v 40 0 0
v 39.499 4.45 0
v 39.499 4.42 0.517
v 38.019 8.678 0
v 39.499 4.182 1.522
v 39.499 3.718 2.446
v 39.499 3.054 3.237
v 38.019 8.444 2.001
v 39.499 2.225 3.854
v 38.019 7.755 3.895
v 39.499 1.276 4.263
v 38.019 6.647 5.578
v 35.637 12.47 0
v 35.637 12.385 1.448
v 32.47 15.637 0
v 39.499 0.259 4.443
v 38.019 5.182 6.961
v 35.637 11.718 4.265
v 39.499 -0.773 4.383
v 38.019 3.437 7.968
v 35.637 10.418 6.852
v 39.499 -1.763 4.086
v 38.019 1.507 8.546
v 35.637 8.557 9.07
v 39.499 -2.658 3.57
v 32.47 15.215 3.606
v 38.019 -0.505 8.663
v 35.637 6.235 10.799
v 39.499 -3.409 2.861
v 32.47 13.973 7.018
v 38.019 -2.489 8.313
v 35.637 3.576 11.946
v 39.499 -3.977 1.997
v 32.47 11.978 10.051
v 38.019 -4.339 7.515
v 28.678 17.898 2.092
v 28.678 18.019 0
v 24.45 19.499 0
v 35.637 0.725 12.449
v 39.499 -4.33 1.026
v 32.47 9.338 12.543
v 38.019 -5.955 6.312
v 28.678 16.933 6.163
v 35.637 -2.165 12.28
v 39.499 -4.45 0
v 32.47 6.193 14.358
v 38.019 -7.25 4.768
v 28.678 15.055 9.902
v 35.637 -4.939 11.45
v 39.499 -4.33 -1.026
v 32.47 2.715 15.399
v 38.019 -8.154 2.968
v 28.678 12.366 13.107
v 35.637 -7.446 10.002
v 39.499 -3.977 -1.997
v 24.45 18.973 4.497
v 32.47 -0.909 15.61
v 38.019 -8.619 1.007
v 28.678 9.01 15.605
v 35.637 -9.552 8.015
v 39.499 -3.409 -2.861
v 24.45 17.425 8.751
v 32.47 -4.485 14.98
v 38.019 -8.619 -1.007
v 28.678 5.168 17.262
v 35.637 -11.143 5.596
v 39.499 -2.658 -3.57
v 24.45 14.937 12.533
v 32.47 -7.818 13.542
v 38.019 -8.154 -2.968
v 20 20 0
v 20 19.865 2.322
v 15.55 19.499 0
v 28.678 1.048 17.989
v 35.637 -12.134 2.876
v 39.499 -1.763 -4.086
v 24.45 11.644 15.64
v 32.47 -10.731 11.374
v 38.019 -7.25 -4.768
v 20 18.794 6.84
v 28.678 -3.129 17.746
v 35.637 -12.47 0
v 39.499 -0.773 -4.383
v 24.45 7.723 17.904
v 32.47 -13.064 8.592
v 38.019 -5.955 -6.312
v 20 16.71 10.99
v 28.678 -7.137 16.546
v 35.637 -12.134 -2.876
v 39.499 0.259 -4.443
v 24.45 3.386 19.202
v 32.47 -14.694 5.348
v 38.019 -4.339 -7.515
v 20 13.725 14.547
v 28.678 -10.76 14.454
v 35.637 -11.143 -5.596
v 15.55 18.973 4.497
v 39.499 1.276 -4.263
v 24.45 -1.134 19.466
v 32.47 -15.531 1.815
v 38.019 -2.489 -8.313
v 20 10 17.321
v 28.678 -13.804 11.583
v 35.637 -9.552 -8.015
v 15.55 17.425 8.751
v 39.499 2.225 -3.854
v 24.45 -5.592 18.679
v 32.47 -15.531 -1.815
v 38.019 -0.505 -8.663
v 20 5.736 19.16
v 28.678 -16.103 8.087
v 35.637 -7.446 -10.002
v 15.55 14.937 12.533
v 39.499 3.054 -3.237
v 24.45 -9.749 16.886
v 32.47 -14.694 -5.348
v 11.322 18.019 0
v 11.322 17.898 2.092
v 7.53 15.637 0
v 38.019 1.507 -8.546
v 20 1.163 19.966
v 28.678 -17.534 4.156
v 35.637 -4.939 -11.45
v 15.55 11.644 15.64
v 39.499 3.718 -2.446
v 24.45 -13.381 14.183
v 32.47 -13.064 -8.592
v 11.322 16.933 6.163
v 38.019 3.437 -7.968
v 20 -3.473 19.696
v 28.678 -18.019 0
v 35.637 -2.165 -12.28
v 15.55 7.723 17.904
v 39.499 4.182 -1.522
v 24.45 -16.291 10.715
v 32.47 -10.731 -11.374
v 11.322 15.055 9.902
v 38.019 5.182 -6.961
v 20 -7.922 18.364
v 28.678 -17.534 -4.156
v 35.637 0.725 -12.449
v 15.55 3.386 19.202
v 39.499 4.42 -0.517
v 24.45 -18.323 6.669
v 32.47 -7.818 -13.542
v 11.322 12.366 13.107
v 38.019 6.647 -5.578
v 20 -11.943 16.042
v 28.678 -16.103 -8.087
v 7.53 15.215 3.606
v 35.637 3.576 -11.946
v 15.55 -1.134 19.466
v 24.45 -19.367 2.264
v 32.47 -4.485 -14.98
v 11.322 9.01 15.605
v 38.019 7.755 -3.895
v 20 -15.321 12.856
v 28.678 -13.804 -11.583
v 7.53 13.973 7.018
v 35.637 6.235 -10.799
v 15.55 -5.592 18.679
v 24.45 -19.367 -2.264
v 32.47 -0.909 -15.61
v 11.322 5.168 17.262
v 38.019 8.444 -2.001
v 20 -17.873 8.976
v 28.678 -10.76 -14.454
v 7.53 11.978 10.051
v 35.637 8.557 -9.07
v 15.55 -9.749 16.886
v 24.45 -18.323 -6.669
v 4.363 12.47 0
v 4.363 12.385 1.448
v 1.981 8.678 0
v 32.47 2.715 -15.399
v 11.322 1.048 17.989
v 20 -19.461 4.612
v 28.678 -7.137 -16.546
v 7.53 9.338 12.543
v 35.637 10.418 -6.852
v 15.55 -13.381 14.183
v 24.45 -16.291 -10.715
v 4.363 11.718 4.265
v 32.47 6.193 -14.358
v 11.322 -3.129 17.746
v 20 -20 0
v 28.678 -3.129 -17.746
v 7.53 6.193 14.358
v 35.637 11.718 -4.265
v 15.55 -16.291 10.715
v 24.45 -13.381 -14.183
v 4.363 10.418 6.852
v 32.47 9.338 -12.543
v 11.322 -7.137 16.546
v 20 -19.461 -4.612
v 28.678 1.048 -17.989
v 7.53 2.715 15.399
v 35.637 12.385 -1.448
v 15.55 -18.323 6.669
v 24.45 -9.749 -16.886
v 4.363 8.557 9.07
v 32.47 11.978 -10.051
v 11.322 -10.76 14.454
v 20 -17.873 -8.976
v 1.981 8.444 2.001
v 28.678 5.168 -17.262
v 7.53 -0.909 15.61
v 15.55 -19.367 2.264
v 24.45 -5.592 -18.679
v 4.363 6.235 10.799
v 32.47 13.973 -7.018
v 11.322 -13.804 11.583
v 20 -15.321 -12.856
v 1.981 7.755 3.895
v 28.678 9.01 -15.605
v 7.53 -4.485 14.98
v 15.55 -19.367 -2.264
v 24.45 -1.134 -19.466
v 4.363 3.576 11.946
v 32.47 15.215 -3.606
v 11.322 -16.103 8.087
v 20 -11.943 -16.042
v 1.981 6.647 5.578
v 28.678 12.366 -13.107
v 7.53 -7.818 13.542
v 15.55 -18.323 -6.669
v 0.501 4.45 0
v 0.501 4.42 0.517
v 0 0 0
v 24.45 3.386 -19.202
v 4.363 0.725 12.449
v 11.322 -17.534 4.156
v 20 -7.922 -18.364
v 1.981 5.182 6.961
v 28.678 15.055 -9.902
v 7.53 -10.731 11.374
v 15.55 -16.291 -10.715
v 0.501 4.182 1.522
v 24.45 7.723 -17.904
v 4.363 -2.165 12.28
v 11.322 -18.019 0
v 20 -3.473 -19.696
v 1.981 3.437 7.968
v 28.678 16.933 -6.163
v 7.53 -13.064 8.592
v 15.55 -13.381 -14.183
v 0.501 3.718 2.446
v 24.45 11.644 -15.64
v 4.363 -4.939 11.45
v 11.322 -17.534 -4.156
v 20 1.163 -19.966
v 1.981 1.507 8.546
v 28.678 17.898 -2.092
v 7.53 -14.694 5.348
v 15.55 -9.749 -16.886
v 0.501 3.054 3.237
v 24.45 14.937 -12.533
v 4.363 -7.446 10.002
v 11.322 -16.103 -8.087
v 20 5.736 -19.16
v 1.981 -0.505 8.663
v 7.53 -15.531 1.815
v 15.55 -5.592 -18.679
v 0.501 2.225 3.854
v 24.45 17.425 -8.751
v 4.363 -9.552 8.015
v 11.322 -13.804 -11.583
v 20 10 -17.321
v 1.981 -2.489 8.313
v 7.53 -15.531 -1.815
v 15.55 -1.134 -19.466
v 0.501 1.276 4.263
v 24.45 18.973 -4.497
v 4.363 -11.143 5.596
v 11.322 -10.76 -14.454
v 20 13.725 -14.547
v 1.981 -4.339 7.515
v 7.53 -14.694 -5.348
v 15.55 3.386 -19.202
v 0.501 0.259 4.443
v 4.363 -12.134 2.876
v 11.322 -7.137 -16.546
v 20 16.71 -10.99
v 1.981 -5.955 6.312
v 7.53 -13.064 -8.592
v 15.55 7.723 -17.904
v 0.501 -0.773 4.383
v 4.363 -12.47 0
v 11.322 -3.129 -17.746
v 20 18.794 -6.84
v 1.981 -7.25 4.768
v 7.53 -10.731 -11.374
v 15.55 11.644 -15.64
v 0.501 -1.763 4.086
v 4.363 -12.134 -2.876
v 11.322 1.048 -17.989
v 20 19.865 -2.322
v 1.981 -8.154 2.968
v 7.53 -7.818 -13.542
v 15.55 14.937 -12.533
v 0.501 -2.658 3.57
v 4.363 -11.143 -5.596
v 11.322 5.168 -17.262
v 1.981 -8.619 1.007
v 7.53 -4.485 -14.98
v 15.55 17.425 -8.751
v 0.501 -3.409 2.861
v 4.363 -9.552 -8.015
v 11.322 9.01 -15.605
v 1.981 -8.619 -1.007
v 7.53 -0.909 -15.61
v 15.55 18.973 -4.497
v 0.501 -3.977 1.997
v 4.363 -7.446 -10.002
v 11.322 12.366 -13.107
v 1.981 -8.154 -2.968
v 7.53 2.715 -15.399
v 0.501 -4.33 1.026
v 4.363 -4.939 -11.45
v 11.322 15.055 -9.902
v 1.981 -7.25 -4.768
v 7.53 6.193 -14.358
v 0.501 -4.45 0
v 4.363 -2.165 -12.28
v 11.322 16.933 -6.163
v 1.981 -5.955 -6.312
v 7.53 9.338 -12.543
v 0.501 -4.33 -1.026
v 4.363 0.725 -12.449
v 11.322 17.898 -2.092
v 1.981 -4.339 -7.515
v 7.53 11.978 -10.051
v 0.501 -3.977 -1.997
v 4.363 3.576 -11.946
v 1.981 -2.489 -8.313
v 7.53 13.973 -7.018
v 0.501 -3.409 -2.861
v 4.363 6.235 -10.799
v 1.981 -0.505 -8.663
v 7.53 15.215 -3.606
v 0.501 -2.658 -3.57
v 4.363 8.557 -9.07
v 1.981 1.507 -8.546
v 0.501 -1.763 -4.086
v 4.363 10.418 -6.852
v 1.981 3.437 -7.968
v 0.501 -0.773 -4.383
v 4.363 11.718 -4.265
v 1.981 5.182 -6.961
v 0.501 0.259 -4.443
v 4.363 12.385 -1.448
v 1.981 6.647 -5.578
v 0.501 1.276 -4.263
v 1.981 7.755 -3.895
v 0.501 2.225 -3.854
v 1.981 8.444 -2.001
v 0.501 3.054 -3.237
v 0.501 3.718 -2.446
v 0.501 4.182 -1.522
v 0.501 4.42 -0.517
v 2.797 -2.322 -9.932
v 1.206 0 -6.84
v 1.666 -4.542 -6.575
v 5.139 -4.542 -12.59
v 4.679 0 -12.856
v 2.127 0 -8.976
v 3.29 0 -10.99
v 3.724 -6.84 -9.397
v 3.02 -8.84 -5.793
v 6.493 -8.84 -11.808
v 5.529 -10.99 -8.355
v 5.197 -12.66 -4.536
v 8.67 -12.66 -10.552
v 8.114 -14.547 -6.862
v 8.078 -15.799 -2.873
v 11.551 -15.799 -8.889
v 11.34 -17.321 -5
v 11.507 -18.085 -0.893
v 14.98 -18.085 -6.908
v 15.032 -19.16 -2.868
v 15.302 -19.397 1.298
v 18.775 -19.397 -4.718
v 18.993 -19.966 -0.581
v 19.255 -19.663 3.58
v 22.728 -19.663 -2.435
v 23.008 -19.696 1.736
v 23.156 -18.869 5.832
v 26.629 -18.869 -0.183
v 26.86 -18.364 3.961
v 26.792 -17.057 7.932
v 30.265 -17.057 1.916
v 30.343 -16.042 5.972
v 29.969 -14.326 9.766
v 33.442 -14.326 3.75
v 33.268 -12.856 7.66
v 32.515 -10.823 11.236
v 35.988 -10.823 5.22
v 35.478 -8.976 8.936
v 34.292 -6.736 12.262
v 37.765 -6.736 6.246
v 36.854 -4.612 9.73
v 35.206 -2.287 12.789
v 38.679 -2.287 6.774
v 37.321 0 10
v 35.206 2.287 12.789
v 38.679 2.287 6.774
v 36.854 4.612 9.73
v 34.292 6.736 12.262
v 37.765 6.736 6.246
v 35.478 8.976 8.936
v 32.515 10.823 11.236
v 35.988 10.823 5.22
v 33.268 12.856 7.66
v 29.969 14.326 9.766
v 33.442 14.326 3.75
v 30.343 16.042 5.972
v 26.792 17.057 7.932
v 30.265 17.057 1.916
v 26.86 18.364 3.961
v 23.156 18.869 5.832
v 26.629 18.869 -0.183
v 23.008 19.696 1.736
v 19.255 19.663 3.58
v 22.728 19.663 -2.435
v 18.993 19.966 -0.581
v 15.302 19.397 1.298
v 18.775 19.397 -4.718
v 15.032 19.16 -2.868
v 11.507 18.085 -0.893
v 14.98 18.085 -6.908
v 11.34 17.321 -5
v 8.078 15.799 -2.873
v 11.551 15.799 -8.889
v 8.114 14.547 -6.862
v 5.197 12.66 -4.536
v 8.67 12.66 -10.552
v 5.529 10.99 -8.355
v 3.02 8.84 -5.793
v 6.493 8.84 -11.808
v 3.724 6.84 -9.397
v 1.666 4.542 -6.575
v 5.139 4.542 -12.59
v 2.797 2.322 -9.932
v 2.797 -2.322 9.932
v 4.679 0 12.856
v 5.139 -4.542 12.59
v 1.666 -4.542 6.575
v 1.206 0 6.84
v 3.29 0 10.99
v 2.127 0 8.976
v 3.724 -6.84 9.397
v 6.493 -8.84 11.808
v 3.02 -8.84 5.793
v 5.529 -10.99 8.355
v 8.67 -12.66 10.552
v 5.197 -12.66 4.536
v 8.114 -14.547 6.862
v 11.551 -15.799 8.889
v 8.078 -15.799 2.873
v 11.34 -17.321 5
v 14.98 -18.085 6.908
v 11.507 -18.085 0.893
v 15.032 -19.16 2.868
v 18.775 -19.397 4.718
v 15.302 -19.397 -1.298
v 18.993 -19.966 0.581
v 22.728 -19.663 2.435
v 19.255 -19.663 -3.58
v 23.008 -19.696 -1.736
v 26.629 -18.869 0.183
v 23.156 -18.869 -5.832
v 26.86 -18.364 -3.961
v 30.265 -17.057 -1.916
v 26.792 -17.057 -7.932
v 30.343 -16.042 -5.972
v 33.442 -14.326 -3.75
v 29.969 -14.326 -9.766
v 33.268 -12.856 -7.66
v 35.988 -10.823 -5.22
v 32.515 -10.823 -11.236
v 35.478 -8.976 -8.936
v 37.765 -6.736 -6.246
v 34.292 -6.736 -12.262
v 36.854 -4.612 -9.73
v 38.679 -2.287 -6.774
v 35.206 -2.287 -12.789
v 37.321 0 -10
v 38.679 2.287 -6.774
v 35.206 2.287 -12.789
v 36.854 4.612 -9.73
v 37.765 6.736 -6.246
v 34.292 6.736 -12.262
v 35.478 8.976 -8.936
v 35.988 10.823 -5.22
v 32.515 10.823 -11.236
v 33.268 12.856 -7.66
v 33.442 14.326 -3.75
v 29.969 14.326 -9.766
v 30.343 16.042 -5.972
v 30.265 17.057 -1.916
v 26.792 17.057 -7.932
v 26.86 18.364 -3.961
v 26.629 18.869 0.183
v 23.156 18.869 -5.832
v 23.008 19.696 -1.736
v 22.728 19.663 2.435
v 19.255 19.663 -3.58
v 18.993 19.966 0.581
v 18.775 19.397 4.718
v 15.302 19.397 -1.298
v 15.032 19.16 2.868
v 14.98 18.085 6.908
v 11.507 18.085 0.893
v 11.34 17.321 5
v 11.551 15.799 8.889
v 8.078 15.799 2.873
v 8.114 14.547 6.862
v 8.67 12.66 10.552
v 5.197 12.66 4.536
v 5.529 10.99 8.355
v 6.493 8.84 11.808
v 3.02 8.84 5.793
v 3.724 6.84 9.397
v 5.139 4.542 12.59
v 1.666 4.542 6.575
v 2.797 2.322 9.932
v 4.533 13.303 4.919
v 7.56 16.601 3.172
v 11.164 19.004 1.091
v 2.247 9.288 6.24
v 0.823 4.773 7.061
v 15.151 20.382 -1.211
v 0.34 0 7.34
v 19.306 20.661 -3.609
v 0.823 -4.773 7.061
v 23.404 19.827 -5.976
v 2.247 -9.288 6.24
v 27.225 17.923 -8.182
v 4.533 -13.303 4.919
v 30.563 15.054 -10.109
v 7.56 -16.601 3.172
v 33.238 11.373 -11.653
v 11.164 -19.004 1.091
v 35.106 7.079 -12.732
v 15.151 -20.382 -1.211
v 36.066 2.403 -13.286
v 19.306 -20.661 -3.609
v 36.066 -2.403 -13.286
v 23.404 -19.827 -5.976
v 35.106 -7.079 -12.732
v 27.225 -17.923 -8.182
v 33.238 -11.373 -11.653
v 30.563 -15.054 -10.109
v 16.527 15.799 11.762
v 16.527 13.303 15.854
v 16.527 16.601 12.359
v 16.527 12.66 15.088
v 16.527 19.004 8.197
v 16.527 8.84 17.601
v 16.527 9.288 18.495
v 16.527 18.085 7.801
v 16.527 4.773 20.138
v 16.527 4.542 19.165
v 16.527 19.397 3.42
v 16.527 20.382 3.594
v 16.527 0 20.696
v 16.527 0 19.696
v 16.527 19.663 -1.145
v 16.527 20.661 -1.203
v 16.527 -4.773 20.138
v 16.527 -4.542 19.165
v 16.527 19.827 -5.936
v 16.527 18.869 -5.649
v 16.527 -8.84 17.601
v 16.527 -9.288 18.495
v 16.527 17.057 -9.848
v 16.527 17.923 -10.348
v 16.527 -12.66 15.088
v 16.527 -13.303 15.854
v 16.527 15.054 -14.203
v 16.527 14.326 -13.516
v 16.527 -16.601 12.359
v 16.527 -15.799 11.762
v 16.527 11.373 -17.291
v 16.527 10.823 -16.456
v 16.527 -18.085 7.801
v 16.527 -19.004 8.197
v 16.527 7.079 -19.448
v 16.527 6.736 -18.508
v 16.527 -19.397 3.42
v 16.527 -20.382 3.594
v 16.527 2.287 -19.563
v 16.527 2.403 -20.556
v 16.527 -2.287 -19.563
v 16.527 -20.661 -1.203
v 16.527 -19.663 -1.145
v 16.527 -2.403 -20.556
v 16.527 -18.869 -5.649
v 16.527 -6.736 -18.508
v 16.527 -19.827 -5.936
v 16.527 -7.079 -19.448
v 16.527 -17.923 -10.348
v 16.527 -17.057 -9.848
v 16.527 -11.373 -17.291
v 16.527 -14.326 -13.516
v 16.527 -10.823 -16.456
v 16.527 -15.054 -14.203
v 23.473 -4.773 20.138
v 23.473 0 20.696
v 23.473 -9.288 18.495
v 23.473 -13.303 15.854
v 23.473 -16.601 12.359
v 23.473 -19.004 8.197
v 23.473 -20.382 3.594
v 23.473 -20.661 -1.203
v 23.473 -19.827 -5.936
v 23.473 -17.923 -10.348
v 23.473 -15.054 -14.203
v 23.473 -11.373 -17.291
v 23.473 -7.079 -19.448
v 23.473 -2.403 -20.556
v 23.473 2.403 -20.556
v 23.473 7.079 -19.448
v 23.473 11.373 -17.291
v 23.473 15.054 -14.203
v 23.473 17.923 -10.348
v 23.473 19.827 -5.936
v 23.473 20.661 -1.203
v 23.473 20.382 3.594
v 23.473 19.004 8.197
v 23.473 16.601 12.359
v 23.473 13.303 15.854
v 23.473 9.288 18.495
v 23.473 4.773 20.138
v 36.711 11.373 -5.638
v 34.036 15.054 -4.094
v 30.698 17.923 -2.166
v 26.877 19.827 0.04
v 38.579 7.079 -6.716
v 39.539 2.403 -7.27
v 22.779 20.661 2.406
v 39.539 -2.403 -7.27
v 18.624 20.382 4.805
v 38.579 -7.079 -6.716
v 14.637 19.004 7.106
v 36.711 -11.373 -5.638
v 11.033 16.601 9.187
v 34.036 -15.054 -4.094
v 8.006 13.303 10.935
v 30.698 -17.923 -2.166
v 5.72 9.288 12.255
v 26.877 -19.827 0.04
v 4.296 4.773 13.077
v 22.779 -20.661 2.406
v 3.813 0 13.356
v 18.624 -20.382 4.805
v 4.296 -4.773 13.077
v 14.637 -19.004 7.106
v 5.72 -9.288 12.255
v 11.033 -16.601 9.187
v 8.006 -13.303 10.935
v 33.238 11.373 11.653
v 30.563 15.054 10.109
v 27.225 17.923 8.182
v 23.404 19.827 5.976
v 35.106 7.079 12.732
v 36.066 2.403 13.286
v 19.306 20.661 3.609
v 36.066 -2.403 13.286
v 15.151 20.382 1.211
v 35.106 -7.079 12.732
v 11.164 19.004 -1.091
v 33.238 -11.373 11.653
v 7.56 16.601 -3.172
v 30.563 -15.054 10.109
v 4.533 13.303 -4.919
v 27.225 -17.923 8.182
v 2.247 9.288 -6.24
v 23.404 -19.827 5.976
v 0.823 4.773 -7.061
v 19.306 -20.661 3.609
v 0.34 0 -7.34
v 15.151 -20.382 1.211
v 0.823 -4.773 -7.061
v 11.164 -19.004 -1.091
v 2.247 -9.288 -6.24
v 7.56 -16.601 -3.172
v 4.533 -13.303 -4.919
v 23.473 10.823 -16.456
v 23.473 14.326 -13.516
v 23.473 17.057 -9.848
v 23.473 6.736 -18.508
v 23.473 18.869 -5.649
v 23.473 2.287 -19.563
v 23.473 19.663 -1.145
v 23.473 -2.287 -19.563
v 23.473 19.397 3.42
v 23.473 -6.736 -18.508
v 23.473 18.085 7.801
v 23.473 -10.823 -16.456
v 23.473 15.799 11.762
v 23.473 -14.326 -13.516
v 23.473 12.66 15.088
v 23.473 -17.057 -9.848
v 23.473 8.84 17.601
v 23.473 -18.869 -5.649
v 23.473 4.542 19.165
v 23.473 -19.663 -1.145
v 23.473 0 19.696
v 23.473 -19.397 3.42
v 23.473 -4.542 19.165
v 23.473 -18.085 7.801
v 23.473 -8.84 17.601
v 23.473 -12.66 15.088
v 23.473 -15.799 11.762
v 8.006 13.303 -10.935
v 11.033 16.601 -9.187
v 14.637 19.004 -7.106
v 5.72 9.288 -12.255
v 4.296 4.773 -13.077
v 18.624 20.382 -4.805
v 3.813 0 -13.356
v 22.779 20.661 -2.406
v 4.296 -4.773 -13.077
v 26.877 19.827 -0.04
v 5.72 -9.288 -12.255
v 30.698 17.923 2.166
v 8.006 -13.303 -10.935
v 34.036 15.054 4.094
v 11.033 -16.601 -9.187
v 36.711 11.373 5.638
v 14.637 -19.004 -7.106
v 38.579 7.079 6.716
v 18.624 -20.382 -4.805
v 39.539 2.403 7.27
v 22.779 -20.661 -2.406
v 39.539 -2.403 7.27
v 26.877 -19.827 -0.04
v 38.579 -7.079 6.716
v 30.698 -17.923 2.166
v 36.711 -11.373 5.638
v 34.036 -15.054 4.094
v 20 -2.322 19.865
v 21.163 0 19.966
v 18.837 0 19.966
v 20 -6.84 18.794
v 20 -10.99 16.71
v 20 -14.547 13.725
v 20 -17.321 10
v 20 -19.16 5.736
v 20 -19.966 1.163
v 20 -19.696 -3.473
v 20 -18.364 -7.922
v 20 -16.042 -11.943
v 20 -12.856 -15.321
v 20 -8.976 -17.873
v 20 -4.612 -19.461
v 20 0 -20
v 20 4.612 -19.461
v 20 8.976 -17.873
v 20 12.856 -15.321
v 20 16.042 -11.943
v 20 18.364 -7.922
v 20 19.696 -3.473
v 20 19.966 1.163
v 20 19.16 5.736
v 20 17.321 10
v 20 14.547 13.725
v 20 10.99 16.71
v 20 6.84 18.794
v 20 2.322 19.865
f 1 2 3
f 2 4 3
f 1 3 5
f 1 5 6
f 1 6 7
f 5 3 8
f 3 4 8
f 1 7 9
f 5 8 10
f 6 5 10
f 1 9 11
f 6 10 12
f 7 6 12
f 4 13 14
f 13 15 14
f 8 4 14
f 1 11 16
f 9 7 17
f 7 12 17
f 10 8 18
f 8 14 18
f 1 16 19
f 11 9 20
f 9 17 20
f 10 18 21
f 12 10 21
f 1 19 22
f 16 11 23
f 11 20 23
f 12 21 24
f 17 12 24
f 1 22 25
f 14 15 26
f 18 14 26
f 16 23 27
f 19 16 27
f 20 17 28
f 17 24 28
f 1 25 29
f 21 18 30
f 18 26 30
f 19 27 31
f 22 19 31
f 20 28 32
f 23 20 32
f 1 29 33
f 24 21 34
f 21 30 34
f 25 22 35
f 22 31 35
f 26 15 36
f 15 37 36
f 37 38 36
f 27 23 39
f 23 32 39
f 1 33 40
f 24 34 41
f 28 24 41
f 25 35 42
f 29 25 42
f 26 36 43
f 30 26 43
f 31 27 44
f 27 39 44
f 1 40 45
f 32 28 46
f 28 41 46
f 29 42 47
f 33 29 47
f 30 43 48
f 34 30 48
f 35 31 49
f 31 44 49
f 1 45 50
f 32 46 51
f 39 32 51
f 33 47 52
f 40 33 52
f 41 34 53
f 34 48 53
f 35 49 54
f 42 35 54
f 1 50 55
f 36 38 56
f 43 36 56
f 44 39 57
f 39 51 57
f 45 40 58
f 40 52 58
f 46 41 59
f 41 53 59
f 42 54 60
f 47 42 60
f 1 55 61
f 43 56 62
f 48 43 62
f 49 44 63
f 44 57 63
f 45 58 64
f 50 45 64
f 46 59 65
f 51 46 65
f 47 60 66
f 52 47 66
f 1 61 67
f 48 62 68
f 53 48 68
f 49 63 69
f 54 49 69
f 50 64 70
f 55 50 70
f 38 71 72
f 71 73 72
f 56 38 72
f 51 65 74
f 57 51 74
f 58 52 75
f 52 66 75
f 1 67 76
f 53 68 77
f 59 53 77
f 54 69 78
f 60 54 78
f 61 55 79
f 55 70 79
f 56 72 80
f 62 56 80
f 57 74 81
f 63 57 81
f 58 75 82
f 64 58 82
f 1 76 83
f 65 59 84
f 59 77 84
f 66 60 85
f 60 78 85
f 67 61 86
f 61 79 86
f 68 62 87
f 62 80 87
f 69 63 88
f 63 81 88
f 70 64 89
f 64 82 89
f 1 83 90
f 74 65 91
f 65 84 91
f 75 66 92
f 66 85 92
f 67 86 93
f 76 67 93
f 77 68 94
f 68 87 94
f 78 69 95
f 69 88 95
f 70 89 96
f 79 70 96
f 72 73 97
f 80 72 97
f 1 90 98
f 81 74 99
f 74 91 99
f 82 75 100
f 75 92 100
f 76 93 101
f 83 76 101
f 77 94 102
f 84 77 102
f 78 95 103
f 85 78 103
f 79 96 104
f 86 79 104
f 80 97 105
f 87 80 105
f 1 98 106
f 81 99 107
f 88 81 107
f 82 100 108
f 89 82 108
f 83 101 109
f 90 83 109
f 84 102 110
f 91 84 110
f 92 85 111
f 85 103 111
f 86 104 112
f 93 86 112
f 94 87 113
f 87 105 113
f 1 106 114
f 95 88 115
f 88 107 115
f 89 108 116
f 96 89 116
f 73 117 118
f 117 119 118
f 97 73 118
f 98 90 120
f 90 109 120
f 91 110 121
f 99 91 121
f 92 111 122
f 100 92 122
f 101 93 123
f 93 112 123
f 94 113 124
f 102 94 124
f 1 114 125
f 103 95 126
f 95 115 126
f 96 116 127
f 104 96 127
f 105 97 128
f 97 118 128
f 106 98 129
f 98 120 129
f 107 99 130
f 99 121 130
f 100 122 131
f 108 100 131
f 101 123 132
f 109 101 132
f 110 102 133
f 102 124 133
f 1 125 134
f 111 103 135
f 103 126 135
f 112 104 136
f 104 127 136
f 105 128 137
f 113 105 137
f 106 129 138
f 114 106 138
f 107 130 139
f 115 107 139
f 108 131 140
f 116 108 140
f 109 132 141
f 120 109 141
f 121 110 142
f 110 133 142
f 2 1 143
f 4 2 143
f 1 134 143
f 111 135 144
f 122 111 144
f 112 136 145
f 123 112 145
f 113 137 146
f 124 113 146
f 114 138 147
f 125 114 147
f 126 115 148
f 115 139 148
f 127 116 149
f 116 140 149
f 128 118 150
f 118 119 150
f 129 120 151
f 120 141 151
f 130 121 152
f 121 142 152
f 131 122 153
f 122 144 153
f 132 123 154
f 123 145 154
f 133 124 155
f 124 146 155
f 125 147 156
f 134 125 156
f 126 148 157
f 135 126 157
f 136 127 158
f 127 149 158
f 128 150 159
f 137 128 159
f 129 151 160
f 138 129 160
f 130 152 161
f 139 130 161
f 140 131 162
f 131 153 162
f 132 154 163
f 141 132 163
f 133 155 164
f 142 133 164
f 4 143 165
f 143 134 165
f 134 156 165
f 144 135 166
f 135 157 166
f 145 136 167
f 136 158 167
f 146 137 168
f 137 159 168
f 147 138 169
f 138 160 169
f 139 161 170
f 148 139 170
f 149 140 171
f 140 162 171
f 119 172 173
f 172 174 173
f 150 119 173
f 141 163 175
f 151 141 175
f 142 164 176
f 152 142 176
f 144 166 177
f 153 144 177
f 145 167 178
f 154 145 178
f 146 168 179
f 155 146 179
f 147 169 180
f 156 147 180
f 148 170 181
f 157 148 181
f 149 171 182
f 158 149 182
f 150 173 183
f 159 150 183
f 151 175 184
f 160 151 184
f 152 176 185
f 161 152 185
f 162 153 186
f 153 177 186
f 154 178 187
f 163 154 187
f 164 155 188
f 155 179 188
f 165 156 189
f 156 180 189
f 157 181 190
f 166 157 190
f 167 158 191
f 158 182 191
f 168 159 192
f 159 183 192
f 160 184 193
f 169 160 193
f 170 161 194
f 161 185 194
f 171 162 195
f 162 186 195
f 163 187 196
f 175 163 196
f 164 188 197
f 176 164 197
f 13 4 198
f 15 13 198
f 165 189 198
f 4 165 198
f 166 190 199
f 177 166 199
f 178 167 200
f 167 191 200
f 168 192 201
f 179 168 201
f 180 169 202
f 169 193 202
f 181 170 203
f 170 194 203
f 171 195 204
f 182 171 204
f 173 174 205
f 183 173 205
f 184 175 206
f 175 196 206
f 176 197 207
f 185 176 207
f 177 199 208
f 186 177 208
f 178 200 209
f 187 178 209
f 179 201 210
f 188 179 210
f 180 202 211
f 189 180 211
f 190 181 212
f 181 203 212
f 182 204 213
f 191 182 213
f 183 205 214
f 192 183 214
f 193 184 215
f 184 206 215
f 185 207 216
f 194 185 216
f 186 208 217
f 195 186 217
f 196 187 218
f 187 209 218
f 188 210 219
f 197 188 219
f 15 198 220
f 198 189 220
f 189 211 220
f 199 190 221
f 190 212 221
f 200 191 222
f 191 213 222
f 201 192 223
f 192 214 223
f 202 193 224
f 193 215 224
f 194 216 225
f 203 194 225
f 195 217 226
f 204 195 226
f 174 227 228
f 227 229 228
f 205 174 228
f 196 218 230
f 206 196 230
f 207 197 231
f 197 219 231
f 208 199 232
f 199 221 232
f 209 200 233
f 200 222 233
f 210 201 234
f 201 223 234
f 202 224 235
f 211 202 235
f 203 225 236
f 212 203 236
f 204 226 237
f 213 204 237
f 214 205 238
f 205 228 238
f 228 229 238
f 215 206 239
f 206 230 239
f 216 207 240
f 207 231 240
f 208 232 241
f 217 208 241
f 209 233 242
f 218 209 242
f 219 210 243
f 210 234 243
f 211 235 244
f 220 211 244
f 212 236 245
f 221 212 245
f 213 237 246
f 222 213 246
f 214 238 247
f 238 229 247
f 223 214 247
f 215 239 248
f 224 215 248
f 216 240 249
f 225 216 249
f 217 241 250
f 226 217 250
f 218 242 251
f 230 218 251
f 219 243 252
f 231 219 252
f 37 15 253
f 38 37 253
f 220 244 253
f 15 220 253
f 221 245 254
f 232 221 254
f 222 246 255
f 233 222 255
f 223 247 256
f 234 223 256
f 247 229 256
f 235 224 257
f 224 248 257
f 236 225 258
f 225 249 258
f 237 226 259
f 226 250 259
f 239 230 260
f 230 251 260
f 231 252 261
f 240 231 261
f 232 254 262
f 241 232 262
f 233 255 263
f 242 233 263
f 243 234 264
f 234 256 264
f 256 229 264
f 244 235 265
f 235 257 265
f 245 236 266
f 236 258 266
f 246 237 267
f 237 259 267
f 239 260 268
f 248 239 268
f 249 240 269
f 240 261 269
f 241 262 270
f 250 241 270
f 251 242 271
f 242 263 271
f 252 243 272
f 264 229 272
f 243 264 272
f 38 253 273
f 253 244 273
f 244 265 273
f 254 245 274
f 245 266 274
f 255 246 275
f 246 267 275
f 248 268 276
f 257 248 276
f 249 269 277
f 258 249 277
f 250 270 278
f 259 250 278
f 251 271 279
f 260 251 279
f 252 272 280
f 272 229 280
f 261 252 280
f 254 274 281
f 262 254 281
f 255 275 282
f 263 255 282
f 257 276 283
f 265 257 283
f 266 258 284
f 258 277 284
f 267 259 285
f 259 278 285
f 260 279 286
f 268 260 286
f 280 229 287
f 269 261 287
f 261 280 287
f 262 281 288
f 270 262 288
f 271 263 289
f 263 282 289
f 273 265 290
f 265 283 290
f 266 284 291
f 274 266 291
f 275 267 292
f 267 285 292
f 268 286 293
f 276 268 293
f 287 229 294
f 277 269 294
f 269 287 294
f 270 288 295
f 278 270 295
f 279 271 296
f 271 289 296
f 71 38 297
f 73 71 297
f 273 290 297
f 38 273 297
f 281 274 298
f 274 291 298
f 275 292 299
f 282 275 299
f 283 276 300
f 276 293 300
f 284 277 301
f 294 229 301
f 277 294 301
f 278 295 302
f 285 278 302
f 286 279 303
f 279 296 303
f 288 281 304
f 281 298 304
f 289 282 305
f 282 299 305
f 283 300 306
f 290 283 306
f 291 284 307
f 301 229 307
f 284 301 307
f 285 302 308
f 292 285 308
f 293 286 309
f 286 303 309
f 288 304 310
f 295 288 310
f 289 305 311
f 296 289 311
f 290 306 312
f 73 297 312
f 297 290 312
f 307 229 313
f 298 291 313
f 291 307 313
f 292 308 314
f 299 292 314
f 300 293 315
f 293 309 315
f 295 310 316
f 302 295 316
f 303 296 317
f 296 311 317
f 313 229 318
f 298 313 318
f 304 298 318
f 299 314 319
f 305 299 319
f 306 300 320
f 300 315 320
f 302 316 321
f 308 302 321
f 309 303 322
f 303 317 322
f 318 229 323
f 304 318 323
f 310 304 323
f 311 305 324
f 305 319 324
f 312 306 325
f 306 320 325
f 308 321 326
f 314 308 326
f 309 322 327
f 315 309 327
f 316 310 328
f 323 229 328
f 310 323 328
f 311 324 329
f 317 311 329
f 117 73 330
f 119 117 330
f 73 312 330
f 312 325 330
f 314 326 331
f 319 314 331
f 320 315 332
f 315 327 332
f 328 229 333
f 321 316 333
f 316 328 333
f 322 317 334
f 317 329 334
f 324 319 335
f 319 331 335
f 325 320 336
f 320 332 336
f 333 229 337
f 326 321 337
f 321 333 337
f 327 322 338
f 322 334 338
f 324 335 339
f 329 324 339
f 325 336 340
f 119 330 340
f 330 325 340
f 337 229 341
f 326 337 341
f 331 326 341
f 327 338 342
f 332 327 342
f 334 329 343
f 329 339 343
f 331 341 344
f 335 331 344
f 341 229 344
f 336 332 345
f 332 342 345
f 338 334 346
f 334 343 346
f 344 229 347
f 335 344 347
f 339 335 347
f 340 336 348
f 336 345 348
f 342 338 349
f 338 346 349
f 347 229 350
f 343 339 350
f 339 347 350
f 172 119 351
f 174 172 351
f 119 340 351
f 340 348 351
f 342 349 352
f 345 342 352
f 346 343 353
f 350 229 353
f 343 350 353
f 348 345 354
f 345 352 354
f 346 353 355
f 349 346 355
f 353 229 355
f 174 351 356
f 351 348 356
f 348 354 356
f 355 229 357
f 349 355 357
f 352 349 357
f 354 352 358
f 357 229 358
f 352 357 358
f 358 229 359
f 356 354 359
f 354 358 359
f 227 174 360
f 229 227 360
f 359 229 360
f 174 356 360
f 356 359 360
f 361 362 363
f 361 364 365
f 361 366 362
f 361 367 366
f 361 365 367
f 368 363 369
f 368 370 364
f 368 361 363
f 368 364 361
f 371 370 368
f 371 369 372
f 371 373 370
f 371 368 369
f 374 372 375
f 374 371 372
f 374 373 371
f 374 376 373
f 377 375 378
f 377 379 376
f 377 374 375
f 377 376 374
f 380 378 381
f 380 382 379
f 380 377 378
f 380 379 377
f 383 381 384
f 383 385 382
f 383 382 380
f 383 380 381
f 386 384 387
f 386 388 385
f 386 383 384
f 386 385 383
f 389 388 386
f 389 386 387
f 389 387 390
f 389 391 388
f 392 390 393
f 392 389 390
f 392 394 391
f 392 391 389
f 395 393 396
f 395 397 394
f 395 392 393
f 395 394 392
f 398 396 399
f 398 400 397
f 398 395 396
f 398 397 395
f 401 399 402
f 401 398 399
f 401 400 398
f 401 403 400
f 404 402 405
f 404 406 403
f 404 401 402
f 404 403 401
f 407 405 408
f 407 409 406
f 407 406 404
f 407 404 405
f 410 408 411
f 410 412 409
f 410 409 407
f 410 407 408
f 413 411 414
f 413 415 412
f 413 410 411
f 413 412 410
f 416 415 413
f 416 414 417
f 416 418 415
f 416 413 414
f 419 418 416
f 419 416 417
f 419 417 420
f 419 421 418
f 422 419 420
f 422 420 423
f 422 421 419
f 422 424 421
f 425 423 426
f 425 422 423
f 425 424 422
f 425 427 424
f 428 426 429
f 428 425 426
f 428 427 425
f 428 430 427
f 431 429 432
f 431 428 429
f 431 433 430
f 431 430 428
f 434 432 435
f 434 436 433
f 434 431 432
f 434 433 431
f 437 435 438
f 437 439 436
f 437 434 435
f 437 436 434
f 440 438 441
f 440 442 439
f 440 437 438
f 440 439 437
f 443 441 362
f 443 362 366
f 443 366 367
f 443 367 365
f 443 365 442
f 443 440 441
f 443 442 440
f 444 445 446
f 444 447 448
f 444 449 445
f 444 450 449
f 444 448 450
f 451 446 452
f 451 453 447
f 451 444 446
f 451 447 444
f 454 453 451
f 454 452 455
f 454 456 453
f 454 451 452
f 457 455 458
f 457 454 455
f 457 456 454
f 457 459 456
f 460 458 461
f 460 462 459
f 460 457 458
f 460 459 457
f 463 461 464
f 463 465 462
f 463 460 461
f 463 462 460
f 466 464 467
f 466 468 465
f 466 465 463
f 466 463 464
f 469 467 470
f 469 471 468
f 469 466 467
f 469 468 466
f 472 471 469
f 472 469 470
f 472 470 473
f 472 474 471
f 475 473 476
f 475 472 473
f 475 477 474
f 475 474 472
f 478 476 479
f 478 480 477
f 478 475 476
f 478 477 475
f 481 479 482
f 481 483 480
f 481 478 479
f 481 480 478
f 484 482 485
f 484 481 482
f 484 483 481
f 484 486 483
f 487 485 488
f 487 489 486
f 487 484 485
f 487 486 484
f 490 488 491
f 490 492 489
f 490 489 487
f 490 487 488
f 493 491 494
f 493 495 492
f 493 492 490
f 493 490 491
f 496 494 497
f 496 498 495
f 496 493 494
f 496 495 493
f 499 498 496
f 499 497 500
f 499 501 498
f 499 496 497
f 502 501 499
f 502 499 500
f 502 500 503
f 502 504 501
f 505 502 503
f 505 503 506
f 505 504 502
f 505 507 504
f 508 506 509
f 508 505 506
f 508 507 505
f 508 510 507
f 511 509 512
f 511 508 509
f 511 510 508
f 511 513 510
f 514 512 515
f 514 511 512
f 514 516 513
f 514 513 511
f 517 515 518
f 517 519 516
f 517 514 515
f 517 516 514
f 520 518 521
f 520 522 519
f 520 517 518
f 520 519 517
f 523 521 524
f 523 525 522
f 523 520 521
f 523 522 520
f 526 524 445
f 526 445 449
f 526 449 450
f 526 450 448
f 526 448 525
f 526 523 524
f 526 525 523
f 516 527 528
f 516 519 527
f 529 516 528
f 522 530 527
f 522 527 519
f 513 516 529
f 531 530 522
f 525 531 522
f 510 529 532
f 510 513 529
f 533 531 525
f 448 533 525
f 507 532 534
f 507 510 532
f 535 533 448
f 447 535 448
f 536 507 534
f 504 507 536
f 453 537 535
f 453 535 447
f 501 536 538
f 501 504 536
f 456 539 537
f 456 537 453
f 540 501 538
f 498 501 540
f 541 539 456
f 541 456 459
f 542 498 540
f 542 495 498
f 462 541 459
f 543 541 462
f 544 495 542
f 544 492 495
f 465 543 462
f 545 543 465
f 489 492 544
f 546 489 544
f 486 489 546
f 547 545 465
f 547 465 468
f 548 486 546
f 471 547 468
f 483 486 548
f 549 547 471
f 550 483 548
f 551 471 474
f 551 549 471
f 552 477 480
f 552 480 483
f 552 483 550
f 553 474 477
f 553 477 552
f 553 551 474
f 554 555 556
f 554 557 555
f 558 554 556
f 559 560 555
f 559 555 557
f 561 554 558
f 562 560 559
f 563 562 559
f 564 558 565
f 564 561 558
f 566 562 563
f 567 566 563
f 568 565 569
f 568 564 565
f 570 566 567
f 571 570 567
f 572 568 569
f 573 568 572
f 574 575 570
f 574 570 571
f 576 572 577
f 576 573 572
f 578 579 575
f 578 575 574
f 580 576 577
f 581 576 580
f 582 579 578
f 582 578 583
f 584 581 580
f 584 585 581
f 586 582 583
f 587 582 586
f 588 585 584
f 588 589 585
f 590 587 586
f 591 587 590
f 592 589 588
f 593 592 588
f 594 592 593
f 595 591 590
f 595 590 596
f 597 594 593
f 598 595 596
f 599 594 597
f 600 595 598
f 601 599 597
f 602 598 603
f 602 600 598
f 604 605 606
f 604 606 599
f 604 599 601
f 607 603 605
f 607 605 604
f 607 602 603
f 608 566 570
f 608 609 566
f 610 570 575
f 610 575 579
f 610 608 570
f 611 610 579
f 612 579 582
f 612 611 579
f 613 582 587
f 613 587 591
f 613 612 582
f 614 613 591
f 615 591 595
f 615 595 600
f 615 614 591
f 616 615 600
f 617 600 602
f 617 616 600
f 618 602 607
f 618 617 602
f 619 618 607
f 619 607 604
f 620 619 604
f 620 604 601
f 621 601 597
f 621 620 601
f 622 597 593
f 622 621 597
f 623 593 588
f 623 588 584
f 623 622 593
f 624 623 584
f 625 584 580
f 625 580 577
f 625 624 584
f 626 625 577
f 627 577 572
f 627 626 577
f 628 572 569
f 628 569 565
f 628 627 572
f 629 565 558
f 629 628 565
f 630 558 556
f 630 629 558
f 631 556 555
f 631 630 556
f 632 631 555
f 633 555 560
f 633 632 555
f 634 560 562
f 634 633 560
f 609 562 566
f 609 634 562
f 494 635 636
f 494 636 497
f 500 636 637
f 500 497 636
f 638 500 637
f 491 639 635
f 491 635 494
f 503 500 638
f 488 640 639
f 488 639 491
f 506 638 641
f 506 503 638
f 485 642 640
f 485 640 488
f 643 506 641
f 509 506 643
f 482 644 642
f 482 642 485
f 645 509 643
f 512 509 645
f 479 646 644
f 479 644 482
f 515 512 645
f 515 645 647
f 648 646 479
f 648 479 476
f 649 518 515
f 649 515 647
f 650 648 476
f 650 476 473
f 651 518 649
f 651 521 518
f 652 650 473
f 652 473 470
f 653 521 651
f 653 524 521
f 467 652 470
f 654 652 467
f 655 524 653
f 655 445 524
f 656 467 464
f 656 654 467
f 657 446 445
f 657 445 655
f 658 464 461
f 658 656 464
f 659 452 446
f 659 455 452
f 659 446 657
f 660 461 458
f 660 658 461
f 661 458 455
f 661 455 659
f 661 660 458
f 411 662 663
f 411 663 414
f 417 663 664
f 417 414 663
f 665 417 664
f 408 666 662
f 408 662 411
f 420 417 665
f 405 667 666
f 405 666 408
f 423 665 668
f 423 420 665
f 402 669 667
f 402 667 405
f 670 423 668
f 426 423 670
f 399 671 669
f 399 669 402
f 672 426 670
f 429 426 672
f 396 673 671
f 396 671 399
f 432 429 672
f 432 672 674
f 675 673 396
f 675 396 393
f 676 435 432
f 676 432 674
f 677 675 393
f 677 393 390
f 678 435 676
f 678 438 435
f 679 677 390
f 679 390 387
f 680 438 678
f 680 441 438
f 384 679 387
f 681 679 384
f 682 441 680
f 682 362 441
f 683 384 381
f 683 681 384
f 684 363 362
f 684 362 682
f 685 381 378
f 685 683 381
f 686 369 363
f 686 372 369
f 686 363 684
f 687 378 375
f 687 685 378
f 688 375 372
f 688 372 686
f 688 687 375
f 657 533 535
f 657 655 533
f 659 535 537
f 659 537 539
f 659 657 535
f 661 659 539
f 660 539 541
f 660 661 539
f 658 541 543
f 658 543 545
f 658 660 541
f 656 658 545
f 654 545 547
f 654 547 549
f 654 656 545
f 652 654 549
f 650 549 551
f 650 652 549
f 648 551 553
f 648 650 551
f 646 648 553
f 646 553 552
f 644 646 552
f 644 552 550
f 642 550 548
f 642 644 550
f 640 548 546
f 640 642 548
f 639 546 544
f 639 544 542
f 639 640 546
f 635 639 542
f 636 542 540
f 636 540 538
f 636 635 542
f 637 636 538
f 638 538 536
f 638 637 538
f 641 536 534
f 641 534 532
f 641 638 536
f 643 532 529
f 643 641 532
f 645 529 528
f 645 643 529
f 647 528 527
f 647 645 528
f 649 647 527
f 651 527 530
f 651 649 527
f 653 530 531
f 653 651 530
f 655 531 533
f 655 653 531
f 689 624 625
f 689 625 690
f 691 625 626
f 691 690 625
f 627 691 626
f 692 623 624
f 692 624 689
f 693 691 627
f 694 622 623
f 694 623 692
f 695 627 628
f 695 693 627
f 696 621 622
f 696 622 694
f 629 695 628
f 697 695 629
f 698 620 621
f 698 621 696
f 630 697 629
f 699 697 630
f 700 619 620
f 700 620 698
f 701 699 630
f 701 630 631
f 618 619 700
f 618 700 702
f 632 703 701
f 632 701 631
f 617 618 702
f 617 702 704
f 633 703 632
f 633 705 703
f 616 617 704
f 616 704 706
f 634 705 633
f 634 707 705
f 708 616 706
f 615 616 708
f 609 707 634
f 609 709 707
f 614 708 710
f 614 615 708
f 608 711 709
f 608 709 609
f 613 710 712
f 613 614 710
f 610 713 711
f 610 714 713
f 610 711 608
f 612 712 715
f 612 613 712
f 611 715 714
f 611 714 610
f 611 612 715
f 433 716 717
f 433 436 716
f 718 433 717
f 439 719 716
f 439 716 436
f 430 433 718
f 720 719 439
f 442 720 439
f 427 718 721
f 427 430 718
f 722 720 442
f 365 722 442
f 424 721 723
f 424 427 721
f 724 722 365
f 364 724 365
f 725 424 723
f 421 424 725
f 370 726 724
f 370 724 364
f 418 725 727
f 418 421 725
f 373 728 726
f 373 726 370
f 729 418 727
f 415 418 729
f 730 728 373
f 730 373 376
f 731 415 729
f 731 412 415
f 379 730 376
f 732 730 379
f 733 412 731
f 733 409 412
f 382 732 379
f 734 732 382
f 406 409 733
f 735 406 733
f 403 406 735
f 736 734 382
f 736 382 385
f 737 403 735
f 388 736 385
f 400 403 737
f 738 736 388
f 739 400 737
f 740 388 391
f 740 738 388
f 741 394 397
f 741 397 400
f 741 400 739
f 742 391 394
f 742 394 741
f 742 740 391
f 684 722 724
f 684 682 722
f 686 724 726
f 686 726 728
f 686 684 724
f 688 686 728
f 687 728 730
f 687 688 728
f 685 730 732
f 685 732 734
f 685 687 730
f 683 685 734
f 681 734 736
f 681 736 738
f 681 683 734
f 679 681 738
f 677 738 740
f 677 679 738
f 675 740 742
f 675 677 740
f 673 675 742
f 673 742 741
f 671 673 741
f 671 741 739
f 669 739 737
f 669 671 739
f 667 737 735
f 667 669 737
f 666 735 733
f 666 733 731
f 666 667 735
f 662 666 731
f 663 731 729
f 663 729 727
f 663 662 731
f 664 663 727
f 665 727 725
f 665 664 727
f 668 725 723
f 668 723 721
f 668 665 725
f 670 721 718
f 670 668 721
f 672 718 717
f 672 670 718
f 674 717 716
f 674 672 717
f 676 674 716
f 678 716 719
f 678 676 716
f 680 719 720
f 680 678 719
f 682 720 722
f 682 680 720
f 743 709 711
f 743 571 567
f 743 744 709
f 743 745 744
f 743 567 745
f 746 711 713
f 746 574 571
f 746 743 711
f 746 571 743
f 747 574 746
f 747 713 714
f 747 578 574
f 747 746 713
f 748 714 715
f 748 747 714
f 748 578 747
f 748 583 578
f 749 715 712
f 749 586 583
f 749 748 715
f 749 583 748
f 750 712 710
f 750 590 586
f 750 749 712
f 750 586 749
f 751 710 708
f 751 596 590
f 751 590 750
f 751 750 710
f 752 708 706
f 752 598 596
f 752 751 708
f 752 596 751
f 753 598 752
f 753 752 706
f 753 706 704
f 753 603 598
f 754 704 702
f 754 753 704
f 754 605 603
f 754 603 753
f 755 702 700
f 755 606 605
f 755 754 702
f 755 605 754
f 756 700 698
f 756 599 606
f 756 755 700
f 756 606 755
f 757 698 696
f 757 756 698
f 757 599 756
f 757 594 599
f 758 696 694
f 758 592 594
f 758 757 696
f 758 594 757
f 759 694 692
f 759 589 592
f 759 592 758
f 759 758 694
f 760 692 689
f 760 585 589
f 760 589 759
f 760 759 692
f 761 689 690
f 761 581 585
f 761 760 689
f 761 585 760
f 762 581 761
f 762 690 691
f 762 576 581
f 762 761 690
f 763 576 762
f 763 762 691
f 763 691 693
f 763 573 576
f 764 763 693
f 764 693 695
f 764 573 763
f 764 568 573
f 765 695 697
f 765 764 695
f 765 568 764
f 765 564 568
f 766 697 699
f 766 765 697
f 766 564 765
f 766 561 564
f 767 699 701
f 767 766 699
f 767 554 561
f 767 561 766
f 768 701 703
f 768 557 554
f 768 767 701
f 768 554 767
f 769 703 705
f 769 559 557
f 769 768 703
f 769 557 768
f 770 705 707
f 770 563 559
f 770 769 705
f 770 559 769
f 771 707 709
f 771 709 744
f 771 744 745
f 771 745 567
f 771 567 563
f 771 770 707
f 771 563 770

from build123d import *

# Parameters (mm, degrees)
R_P_TITION_CIRCULAIRE3_COUNT = 3
R_P_TITION_CIRCULAIRE3_ANGLE = 120


with BuildPart() as part:
    # Esquisse1 → Révolution1 (revolve)
    with BuildSketch(Plane.XY):
        with BuildLine():
            Line((0, 0), (40, 0))
            ThreePointArc((40, 0), (20, 20), (0, 0))
        make_face()
    revolve(axis=Axis((0, 0, 0), (1, 0, 0)))


with BuildPart() as body_2:
    # Esquisse2 → Révolution2 (revolve)
    with BuildSketch(Plane.XY, mode=Mode.PRIVATE) as r_volution2_sk:
        with BuildLine():
            Line((16.527036447, 19.69615506), (16.527036447, 20.69615506))
            Line((16.527036447, 20.69615506), (23.472963553, 20.69615506))
            Line((23.472963553, 20.69615506), (23.472963553, 19.69615506))
            ThreePointArc((23.472963553, 19.69615506), (20, 20), (16.527036447, 19.69615506))
        make_face()
    revolve(r_volution2_sk.sketch.rotate(Axis((0, 0, 0), (1, 0, 0)), 90), axis=Axis((0, 0, 0), (1, 0, 0)))


with BuildPart() as r_p_tition_circulaire3_1:
    # Répétition circulaire3: pattern copy
    add(body_2.part.rotate(Axis((20, 0, 0), (0, -1, 0)), 1 * R_P_TITION_CIRCULAIRE3_ANGLE / (R_P_TITION_CIRCULAIRE3_COUNT - 1)))


with BuildPart() as r_p_tition_circulaire3_2:
    # Répétition circulaire3: pattern copy
    add(body_2.part.rotate(Axis((20, 0, 0), (0, -1, 0)), 2 * R_P_TITION_CIRCULAIRE3_ANGLE / (R_P_TITION_CIRCULAIRE3_COUNT - 1)))


solid = Compound([part.part, body_2.part, r_p_tition_circulaire3_1.part, r_p_tition_circulaire3_2.part])
